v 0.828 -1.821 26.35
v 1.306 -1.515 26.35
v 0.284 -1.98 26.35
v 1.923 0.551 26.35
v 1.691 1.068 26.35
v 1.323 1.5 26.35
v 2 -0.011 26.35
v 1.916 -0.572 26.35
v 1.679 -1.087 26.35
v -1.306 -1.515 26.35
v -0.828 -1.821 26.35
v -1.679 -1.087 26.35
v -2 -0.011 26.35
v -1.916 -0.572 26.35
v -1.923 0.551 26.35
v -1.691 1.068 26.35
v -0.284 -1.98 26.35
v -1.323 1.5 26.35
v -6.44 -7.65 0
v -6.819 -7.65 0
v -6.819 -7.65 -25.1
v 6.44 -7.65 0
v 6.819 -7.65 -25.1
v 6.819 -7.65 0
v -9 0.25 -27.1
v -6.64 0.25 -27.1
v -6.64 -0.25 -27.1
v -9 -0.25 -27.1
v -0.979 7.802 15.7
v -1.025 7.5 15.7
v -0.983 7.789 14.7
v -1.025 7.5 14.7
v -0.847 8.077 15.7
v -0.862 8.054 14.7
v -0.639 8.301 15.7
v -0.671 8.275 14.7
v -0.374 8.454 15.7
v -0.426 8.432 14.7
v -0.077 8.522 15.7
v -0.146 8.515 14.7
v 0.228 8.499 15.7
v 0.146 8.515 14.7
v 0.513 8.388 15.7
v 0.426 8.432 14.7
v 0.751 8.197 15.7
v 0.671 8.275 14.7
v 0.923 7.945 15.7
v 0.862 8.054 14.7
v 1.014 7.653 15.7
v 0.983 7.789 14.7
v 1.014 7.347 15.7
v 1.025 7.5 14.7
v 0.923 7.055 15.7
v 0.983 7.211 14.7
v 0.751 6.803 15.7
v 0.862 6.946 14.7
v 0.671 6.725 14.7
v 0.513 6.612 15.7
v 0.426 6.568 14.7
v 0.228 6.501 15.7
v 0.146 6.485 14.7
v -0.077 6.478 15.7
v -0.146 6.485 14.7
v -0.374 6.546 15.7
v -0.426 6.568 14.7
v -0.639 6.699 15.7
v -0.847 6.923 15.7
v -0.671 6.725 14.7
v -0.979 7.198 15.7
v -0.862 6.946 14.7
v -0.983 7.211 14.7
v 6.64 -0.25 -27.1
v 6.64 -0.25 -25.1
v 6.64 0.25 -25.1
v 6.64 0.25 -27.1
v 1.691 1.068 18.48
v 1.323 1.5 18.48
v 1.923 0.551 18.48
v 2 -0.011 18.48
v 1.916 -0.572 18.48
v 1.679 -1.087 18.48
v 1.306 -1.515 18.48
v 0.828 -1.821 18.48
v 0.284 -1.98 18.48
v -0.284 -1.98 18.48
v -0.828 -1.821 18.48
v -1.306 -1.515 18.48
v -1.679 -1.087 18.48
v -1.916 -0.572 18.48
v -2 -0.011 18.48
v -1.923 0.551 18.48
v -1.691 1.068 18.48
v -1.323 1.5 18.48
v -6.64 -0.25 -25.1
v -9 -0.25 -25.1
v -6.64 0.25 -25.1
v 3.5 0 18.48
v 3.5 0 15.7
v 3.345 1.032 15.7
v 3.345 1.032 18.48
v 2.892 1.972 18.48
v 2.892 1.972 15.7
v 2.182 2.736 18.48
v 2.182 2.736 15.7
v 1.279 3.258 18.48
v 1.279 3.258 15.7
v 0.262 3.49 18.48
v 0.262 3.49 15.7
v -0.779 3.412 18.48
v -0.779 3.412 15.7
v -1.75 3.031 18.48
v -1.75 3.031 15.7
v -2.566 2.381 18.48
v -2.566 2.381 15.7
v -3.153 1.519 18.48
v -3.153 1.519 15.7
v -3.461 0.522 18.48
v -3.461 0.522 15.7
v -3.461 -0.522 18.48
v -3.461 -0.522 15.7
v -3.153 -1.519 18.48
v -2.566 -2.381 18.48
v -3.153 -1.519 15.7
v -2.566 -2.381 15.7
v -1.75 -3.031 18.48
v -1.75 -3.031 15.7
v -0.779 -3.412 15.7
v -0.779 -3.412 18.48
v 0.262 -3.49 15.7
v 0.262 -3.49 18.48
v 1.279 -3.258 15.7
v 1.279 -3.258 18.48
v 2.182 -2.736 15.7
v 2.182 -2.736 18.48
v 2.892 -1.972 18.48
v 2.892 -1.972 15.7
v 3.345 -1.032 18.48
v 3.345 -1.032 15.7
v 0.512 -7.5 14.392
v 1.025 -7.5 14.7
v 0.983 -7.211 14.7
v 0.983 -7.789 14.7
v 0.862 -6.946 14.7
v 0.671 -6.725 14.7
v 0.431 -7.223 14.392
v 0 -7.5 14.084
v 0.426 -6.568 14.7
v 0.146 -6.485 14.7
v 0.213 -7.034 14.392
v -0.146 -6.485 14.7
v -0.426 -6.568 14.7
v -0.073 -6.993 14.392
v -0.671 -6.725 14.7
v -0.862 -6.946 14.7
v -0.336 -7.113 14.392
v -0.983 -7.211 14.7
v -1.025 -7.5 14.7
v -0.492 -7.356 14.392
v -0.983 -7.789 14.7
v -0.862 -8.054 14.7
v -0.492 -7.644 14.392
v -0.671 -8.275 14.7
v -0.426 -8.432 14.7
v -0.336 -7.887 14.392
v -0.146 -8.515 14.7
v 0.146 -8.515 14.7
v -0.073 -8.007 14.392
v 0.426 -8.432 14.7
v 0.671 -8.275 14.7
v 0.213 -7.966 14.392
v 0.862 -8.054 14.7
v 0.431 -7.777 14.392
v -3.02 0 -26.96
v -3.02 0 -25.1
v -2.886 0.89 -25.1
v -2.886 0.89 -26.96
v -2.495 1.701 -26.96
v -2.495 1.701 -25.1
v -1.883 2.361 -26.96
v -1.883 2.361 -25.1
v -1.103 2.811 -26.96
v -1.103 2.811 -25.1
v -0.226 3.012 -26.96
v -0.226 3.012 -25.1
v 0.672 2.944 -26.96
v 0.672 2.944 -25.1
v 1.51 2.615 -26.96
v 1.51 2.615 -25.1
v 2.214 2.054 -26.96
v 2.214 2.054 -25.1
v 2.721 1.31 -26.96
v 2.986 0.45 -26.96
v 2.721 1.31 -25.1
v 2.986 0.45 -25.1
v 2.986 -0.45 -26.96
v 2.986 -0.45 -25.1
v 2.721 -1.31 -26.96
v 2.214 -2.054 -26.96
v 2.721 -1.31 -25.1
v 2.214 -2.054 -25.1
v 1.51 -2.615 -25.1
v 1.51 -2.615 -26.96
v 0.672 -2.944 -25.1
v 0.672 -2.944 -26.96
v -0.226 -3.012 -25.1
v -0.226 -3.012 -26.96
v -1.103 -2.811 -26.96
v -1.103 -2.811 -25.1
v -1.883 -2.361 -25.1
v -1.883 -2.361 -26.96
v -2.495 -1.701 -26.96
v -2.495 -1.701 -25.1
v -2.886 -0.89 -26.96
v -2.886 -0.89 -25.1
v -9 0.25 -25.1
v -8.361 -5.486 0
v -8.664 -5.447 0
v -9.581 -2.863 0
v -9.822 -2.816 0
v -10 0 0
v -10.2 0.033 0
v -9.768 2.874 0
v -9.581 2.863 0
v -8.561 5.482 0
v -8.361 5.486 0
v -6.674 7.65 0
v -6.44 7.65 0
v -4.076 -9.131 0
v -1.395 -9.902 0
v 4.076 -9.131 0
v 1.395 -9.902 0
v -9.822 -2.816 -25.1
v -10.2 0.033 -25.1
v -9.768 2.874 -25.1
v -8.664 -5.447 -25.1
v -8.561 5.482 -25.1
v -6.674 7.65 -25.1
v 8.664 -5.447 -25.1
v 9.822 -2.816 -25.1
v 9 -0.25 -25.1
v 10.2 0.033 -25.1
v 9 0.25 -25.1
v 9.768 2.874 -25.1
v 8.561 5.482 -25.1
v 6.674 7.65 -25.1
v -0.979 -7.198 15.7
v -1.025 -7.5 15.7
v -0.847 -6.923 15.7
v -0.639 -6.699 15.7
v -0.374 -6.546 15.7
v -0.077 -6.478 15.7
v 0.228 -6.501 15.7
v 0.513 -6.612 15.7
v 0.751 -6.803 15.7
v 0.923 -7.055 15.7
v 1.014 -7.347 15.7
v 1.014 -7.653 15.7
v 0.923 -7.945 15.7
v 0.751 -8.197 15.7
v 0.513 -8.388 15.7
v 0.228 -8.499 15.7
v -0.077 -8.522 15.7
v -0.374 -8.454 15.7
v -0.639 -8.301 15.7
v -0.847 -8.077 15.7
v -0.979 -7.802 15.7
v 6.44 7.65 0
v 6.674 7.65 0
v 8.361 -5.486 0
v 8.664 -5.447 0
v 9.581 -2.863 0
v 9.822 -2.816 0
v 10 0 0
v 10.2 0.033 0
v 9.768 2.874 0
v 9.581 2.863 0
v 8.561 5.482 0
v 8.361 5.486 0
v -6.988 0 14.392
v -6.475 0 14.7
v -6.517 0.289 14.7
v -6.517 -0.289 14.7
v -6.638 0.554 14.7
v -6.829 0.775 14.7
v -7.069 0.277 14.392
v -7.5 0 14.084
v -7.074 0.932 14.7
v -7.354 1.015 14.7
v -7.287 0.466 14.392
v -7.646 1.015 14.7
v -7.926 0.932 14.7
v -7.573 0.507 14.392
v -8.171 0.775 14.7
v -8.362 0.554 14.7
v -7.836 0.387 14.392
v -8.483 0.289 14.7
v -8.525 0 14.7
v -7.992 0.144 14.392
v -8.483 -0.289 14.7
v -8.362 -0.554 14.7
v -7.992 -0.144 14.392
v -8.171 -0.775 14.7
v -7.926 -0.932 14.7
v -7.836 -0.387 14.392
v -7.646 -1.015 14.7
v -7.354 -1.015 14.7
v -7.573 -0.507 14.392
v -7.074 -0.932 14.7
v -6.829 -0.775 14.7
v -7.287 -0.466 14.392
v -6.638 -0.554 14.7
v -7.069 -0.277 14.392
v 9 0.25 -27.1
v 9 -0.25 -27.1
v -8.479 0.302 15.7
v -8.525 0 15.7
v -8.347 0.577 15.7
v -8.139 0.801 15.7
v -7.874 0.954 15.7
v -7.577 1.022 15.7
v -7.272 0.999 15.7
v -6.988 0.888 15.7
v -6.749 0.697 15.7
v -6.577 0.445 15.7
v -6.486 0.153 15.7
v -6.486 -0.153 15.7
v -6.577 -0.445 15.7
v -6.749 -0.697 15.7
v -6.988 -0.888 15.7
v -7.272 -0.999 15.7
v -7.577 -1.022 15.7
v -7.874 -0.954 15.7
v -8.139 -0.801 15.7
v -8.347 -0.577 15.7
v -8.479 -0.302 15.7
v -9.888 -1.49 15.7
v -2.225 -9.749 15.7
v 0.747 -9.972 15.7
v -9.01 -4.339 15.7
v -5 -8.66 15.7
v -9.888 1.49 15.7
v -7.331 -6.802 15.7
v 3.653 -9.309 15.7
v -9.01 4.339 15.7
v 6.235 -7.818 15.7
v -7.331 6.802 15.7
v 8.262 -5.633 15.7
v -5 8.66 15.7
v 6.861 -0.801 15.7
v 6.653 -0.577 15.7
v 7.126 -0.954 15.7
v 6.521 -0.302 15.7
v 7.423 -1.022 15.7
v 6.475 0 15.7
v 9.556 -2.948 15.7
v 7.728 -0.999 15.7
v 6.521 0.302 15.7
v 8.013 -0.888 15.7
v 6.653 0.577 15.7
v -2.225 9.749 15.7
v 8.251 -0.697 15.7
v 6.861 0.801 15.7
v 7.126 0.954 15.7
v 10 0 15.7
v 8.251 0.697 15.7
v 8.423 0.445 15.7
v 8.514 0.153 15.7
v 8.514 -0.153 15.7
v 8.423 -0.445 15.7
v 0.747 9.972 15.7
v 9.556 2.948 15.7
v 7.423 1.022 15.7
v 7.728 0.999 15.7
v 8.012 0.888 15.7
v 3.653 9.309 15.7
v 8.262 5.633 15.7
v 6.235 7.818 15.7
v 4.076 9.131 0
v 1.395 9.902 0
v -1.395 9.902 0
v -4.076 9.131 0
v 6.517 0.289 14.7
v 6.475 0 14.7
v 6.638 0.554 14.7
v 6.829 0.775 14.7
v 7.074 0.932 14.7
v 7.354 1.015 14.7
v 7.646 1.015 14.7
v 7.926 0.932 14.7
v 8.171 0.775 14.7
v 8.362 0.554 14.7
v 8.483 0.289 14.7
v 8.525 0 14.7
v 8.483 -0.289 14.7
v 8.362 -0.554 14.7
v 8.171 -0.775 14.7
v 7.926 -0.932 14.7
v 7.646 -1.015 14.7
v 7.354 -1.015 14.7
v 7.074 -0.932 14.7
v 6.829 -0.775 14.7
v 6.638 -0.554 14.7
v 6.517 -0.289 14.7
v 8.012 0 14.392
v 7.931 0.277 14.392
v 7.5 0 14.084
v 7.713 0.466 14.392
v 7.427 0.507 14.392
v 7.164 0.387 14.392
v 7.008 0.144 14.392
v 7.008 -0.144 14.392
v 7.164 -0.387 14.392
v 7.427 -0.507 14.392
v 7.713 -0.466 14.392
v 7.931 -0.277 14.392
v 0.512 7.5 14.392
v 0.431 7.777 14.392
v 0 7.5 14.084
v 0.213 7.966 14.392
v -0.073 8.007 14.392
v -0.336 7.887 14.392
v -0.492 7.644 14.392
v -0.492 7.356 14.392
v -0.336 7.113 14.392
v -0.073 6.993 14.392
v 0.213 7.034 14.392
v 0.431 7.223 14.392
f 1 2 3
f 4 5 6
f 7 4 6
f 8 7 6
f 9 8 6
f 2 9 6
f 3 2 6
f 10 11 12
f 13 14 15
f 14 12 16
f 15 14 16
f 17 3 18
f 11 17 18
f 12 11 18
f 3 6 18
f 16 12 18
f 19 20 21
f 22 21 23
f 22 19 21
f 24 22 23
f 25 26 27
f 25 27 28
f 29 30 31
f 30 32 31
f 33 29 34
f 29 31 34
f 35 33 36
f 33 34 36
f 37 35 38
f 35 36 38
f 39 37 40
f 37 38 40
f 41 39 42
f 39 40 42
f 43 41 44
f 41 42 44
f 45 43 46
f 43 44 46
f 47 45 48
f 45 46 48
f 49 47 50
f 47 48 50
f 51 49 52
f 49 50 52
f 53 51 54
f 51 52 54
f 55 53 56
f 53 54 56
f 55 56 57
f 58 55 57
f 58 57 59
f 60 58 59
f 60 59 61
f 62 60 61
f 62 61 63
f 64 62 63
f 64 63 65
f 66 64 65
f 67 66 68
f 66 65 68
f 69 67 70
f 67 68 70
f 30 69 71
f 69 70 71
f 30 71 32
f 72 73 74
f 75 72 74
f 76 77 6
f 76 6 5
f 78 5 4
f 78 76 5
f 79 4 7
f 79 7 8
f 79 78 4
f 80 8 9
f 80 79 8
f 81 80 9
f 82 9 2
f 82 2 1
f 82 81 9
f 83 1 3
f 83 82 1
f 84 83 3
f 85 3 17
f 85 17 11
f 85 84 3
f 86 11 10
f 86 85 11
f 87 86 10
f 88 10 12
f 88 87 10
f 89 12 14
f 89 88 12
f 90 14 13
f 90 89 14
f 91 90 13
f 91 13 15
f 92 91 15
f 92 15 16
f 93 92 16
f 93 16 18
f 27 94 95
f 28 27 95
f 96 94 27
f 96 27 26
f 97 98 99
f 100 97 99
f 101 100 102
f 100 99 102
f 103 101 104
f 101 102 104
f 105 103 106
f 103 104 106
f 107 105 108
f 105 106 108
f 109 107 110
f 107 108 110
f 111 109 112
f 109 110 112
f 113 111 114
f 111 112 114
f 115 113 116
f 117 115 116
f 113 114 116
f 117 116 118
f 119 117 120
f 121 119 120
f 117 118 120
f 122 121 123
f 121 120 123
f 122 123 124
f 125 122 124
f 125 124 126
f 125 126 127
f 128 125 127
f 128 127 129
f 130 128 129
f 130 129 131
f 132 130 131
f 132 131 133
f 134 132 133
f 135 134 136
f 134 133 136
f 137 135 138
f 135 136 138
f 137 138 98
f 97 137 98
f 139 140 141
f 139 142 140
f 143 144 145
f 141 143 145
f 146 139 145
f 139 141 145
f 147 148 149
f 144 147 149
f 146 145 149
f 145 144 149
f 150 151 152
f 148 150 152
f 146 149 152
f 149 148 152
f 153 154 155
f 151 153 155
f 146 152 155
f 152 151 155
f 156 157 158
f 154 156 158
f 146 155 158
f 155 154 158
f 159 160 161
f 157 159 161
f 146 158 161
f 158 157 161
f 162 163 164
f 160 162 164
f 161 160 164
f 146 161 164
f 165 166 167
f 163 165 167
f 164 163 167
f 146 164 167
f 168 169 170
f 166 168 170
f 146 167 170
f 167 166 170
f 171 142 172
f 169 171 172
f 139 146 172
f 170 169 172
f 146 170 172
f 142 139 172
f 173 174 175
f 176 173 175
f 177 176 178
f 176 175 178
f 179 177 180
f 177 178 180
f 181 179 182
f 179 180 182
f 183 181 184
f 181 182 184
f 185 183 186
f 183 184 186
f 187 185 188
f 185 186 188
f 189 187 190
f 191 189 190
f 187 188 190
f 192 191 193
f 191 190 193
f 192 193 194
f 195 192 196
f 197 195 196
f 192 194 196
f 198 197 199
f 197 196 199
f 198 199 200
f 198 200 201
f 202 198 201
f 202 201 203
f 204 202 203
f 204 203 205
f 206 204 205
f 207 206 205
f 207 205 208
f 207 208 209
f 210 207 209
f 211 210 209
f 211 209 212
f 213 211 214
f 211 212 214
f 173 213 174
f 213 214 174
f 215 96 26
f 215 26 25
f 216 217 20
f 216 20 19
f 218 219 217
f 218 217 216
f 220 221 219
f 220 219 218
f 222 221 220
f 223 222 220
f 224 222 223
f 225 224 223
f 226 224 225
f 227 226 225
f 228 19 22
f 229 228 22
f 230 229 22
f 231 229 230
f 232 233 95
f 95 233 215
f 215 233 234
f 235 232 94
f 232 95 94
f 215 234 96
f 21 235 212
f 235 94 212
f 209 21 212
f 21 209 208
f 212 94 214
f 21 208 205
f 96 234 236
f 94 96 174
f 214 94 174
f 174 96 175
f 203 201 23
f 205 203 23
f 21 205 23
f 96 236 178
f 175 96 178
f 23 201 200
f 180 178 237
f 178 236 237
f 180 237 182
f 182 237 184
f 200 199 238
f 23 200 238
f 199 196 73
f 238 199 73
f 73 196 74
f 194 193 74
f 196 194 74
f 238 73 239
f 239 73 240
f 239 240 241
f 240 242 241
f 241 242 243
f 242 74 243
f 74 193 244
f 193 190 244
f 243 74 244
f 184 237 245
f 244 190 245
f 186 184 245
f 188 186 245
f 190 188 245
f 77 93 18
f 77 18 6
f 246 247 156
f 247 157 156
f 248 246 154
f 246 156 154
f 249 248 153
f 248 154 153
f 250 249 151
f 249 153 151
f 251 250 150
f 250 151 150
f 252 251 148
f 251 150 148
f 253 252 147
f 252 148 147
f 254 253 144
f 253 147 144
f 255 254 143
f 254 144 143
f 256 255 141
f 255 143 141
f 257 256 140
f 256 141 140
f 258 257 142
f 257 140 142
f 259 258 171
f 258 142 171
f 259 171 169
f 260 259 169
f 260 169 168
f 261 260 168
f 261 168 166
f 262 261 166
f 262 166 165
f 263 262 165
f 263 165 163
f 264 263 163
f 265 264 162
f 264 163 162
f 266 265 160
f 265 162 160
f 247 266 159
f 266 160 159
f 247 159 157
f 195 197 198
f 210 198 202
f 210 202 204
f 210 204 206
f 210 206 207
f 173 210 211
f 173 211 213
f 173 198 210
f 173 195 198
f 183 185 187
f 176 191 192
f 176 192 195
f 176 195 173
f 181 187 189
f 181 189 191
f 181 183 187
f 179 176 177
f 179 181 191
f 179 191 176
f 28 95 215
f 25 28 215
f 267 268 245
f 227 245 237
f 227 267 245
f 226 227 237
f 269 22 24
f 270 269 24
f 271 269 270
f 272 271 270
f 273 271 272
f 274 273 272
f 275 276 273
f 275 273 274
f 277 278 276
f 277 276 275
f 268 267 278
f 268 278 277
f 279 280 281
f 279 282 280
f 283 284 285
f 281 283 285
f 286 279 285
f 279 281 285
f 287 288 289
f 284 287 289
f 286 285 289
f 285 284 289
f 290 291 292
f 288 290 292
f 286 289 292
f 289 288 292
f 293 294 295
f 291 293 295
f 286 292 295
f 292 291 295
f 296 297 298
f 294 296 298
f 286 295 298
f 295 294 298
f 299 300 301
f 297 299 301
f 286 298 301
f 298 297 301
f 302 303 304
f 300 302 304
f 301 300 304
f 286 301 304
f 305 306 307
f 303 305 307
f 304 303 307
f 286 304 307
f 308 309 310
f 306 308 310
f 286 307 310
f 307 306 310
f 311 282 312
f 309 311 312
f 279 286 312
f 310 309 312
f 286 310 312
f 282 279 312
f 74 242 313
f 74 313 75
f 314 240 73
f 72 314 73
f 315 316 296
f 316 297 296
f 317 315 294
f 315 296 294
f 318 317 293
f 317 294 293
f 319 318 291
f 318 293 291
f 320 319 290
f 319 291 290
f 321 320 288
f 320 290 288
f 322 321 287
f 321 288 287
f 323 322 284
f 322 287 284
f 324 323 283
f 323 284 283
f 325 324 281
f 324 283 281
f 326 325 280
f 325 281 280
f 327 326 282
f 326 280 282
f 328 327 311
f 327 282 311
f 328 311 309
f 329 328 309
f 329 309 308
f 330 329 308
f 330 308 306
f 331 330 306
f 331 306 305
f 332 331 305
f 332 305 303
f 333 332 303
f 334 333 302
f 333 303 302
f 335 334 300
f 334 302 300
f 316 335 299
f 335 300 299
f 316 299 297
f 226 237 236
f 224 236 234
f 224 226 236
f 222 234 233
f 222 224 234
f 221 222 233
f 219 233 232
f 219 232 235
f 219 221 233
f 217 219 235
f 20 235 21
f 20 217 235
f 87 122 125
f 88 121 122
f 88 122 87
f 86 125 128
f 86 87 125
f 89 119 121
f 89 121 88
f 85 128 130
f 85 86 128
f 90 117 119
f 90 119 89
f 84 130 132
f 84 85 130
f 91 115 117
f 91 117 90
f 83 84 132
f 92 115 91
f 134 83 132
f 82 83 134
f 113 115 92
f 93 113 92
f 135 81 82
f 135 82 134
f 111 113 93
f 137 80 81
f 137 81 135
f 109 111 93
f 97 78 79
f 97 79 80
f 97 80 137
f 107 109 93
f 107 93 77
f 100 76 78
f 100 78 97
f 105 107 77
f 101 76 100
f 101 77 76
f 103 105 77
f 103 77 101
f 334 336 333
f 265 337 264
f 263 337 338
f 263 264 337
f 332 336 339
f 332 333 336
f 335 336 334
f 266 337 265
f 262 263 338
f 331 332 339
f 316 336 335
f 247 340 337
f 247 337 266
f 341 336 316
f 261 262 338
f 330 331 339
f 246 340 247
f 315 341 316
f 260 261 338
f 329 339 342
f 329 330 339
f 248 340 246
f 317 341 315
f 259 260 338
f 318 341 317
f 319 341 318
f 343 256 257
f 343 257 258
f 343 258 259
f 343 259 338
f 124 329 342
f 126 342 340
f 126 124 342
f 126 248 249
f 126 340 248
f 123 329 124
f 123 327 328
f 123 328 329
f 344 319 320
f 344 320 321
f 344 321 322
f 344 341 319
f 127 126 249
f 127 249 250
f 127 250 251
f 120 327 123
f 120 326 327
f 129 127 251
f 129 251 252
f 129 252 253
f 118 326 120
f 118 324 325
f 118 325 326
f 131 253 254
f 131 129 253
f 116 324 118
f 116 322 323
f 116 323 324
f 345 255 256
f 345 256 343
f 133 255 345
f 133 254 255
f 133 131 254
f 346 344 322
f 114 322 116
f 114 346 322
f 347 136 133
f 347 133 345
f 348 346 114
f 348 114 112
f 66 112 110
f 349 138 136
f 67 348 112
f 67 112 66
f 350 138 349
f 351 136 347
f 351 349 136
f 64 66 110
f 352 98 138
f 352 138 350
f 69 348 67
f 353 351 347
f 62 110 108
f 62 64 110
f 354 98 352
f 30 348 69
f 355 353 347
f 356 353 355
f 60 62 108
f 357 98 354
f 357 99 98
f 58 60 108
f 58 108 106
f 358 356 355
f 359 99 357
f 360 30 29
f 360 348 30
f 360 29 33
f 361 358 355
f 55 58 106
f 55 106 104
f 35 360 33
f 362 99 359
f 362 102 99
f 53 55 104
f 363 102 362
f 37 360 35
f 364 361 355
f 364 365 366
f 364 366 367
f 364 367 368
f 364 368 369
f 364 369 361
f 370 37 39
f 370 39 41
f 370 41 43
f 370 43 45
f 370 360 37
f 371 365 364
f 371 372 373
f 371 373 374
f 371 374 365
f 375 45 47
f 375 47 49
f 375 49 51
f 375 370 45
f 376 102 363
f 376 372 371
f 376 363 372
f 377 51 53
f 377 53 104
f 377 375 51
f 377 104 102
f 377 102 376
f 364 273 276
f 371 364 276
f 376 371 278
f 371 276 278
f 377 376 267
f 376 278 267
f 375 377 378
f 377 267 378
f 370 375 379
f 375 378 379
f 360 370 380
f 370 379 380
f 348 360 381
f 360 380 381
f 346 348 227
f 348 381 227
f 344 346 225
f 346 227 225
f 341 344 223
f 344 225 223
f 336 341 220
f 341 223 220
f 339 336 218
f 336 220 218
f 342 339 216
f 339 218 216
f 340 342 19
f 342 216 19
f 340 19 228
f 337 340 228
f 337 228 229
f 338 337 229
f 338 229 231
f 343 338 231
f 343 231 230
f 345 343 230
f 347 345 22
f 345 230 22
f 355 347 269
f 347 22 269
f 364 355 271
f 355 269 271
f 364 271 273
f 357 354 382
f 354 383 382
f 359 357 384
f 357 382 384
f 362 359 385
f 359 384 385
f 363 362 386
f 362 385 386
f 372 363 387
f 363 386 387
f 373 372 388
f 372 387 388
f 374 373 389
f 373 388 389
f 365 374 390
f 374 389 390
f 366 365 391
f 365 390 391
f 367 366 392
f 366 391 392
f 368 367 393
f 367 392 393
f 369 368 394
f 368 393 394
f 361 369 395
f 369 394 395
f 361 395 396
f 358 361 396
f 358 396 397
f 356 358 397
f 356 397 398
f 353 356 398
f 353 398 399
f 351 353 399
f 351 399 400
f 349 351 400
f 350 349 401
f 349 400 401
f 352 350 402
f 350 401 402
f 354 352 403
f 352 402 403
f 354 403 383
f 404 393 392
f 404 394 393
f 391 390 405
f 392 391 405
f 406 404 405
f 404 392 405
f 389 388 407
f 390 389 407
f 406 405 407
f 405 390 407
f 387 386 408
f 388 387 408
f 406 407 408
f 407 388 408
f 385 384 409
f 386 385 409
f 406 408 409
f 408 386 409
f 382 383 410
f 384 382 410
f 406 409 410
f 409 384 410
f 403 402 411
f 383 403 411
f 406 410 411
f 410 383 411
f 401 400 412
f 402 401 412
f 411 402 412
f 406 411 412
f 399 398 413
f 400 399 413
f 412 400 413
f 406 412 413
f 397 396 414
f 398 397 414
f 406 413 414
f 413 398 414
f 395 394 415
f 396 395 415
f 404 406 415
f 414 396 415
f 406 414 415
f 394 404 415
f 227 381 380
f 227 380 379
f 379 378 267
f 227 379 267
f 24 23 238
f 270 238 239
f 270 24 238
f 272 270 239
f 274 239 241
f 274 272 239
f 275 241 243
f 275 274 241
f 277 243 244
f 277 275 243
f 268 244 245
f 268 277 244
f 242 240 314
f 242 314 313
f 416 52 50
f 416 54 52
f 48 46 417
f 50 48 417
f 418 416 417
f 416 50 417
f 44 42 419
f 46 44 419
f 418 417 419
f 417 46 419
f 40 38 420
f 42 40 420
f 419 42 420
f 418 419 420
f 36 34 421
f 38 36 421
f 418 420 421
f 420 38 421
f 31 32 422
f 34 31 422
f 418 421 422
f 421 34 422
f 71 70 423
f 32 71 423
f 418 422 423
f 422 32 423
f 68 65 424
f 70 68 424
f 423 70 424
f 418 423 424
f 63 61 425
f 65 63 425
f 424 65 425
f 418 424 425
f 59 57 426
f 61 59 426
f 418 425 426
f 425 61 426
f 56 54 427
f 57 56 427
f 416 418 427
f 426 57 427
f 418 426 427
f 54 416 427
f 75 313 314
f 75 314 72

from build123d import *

# Parameters (mm, degrees)
SKETCH1_R                    = 10
GEARBOX_DEPTH                = 15.7
MOTOR_DEPTH                  = 25.1
SKETCH4_R                    = 3.5
OUTPUT_SHAFT_COLLAR_DEPTH    = 2.78
OUTPUT_SHAFT_DEPTH           = 7.87
SKETCH6_R                    = 3.02
BOSS_EXTRUDE11_DEPTH         = 1.86
SKETCH10_W                   = 2.36
SKETCH10_H                   = 0.5
BOSS_EXTRUDE13_DEPTH         = 2
M2_5X0_45_TAPPED_HOLE1_D     = 2.05
M2_5X0_45_TAPPED_HOLE1_DEPTH = 1
M2_5X0_45_TAPPED_HOLE1_TIP   = 0.615882135


with BuildPart() as part:
    # Sketch1 → GearBox (new body)
    with BuildSketch(Plane.XY):
        Circle(SKETCH1_R)
    extrude(amount=GEARBOX_DEPTH)

    # Sketch3 → Motor (add)
    with BuildSketch(Plane(origin=(0, 0, 0), x_dir=(-1, 0, 0), z_dir=(0, 0, -1))):
        with BuildLine():
            Line((-6.674371666, 7.65), (6.674371666, 7.65))
            ThreePointArc((6.674371666, 7.65), (10.2, 0.032634765), (6.818960021, -7.65))
            Line((6.818960021, -7.65), (-6.818960021, -7.65))
            ThreePointArc((-6.818960021, -7.65), (-10.2, 0.032634765), (-6.674371666, 7.65))
        make_face()
    extrude(amount=MOTOR_DEPTH)

    # Sketch4 → Output_Shaft_Collar (add)
    with BuildSketch(Plane.XY.offset(15.7)):
        Circle(SKETCH4_R)
    extrude(amount=OUTPUT_SHAFT_COLLAR_DEPTH)

    # Sketch5 → Output_Shaft (add)
    with BuildSketch(Plane.XY.offset(18.48)):
        with BuildLine():
            Line((-1.322875656, 1.5), (1.322875656, 1.5))
            ThreePointArc((1.322875656, 1.5), (0, -2), (-1.322875656, 1.5))
        make_face()
    extrude(amount=OUTPUT_SHAFT_DEPTH)

    # Sketch6 → Boss-Extrude11 (add)
    with BuildSketch(Plane(origin=(0, 0, -25.1), x_dir=(-1, 0, 0), z_dir=(0, 0, -1))):
        Circle(SKETCH6_R)
    extrude(amount=BOSS_EXTRUDE11_DEPTH)

    # Sketch10 → Boss-Extrude13 (add)
    with BuildSketch(Plane(origin=(0, 0, -25.1), x_dir=(-1, 0, 0), z_dir=(0, 0, -1))):
        with Locations((-7.82, 0)):
            Rectangle(SKETCH10_W, SKETCH10_H)
        with Locations((7.82, 0)):
            Rectangle(SKETCH10_W, SKETCH10_H)
    extrude(amount=BOSS_EXTRUDE13_DEPTH)

    # M2.5x0.45 Tapped Hole1
    with Locations(Plane.XY.offset(15.7)):
        with Locations((-7.5, 0), (7.5, 0), (0, 7.5), (0, -7.5)):
            Hole(M2_5X0_45_TAPPED_HOLE1_D / 2, depth=M2_5X0_45_TAPPED_HOLE1_DEPTH)
            with Locations((0, 0, -(M2_5X0_45_TAPPED_HOLE1_DEPTH + M2_5X0_45_TAPPED_HOLE1_TIP / 2))):  # 118° drill point
                Cone(0, M2_5X0_45_TAPPED_HOLE1_D / 2, M2_5X0_45_TAPPED_HOLE1_TIP, mode=Mode.SUBTRACT)


solid = part.part
